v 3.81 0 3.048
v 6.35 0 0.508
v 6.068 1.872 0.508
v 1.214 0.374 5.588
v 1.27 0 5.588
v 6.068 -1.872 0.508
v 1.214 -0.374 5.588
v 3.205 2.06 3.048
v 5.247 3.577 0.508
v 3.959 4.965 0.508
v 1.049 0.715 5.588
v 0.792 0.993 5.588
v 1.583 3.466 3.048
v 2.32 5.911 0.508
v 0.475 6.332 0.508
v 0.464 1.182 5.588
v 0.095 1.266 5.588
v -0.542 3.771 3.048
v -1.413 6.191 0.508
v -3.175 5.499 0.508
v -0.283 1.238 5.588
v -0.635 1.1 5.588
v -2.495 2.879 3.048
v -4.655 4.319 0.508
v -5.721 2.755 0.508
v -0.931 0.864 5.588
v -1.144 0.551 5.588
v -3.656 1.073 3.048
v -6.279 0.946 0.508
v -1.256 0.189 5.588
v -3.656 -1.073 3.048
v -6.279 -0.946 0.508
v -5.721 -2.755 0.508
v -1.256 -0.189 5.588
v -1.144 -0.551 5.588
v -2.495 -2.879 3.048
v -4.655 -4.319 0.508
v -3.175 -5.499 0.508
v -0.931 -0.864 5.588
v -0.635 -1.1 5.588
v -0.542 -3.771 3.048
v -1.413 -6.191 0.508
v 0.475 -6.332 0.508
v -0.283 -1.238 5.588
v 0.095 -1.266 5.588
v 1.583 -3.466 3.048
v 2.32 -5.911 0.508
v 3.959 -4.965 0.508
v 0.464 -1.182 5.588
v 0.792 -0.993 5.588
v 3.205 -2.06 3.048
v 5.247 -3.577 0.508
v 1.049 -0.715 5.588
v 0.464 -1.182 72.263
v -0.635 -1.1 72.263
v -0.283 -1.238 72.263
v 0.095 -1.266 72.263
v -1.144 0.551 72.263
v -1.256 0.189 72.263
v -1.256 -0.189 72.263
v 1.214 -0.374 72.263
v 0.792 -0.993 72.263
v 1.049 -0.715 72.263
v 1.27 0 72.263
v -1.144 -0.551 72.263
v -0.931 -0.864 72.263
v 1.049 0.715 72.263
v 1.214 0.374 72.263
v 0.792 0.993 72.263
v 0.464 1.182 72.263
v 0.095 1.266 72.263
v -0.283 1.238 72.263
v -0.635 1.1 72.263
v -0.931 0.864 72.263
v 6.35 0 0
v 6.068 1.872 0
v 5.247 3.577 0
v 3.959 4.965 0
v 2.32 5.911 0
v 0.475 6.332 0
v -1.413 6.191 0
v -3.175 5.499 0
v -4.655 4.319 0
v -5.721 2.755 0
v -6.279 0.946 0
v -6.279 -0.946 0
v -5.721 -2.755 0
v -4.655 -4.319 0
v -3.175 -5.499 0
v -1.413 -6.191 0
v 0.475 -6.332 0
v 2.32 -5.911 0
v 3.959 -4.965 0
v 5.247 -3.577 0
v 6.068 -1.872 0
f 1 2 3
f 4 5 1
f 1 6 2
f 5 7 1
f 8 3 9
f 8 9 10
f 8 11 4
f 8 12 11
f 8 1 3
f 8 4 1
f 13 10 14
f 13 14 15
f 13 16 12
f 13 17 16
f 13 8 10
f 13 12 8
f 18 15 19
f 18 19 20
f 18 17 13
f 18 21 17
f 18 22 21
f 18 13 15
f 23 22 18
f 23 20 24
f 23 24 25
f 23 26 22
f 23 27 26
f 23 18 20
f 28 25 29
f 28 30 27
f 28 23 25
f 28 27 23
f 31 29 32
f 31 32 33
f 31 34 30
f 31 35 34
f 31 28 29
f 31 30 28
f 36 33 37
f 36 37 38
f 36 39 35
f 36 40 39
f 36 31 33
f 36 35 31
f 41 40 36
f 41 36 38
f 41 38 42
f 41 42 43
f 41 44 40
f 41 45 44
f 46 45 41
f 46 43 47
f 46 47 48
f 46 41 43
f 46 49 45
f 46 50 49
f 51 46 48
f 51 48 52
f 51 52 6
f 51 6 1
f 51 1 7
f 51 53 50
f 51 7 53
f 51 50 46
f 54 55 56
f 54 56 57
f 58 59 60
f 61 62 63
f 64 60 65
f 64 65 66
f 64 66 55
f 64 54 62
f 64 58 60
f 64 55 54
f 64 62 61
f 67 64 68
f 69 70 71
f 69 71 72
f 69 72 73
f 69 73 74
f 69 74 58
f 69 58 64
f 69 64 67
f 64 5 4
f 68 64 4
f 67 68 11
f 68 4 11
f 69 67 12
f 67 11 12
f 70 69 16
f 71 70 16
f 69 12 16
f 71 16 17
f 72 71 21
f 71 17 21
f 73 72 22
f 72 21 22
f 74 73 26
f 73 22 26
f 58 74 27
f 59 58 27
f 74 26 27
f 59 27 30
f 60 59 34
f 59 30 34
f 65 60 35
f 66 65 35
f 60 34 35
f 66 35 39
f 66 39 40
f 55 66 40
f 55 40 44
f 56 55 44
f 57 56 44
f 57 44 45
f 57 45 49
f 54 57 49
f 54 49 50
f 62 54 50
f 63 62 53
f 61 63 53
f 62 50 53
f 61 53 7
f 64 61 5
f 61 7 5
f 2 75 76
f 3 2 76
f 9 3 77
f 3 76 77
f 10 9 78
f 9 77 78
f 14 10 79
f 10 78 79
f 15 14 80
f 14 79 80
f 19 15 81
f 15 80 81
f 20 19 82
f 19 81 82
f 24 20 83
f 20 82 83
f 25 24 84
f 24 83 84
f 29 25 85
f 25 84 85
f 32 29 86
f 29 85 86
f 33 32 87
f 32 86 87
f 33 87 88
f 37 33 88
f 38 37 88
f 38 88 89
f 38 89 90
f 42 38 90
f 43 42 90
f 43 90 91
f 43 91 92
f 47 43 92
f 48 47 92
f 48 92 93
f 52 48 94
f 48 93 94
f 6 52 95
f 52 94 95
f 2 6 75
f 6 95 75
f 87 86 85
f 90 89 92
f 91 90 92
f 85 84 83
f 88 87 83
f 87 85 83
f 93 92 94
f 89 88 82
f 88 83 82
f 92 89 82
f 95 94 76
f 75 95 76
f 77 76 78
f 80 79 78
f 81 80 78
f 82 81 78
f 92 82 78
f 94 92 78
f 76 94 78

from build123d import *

# Parameters (mm, degrees)
F0_R      = 6.35
F1_DEPTH  = 5.588
F2_SIZE   = 5.08
F1_FACE_R = 1.27
F3_DEPTH  = 66.675


with BuildPart() as f1:
    # F0 (on Top) → F1 (new body)
    with BuildSketch(Plane.XY):
        Circle(F0_R)
    extrude(amount=F1_DEPTH)

    # F2
    f2_edges = [f1.edges().sort_by_distance(p)[0] for p in [
        (-6.35, 0, 5.588),
    ]]
    chamfer(f2_edges, length=F2_SIZE)

    # F1_face (on face) → F3 (join)
    with BuildSketch(Plane.XY.offset(5.588)):
        Circle(F1_FACE_R)
    extrude(amount=F3_DEPTH)


solid = f1.part
